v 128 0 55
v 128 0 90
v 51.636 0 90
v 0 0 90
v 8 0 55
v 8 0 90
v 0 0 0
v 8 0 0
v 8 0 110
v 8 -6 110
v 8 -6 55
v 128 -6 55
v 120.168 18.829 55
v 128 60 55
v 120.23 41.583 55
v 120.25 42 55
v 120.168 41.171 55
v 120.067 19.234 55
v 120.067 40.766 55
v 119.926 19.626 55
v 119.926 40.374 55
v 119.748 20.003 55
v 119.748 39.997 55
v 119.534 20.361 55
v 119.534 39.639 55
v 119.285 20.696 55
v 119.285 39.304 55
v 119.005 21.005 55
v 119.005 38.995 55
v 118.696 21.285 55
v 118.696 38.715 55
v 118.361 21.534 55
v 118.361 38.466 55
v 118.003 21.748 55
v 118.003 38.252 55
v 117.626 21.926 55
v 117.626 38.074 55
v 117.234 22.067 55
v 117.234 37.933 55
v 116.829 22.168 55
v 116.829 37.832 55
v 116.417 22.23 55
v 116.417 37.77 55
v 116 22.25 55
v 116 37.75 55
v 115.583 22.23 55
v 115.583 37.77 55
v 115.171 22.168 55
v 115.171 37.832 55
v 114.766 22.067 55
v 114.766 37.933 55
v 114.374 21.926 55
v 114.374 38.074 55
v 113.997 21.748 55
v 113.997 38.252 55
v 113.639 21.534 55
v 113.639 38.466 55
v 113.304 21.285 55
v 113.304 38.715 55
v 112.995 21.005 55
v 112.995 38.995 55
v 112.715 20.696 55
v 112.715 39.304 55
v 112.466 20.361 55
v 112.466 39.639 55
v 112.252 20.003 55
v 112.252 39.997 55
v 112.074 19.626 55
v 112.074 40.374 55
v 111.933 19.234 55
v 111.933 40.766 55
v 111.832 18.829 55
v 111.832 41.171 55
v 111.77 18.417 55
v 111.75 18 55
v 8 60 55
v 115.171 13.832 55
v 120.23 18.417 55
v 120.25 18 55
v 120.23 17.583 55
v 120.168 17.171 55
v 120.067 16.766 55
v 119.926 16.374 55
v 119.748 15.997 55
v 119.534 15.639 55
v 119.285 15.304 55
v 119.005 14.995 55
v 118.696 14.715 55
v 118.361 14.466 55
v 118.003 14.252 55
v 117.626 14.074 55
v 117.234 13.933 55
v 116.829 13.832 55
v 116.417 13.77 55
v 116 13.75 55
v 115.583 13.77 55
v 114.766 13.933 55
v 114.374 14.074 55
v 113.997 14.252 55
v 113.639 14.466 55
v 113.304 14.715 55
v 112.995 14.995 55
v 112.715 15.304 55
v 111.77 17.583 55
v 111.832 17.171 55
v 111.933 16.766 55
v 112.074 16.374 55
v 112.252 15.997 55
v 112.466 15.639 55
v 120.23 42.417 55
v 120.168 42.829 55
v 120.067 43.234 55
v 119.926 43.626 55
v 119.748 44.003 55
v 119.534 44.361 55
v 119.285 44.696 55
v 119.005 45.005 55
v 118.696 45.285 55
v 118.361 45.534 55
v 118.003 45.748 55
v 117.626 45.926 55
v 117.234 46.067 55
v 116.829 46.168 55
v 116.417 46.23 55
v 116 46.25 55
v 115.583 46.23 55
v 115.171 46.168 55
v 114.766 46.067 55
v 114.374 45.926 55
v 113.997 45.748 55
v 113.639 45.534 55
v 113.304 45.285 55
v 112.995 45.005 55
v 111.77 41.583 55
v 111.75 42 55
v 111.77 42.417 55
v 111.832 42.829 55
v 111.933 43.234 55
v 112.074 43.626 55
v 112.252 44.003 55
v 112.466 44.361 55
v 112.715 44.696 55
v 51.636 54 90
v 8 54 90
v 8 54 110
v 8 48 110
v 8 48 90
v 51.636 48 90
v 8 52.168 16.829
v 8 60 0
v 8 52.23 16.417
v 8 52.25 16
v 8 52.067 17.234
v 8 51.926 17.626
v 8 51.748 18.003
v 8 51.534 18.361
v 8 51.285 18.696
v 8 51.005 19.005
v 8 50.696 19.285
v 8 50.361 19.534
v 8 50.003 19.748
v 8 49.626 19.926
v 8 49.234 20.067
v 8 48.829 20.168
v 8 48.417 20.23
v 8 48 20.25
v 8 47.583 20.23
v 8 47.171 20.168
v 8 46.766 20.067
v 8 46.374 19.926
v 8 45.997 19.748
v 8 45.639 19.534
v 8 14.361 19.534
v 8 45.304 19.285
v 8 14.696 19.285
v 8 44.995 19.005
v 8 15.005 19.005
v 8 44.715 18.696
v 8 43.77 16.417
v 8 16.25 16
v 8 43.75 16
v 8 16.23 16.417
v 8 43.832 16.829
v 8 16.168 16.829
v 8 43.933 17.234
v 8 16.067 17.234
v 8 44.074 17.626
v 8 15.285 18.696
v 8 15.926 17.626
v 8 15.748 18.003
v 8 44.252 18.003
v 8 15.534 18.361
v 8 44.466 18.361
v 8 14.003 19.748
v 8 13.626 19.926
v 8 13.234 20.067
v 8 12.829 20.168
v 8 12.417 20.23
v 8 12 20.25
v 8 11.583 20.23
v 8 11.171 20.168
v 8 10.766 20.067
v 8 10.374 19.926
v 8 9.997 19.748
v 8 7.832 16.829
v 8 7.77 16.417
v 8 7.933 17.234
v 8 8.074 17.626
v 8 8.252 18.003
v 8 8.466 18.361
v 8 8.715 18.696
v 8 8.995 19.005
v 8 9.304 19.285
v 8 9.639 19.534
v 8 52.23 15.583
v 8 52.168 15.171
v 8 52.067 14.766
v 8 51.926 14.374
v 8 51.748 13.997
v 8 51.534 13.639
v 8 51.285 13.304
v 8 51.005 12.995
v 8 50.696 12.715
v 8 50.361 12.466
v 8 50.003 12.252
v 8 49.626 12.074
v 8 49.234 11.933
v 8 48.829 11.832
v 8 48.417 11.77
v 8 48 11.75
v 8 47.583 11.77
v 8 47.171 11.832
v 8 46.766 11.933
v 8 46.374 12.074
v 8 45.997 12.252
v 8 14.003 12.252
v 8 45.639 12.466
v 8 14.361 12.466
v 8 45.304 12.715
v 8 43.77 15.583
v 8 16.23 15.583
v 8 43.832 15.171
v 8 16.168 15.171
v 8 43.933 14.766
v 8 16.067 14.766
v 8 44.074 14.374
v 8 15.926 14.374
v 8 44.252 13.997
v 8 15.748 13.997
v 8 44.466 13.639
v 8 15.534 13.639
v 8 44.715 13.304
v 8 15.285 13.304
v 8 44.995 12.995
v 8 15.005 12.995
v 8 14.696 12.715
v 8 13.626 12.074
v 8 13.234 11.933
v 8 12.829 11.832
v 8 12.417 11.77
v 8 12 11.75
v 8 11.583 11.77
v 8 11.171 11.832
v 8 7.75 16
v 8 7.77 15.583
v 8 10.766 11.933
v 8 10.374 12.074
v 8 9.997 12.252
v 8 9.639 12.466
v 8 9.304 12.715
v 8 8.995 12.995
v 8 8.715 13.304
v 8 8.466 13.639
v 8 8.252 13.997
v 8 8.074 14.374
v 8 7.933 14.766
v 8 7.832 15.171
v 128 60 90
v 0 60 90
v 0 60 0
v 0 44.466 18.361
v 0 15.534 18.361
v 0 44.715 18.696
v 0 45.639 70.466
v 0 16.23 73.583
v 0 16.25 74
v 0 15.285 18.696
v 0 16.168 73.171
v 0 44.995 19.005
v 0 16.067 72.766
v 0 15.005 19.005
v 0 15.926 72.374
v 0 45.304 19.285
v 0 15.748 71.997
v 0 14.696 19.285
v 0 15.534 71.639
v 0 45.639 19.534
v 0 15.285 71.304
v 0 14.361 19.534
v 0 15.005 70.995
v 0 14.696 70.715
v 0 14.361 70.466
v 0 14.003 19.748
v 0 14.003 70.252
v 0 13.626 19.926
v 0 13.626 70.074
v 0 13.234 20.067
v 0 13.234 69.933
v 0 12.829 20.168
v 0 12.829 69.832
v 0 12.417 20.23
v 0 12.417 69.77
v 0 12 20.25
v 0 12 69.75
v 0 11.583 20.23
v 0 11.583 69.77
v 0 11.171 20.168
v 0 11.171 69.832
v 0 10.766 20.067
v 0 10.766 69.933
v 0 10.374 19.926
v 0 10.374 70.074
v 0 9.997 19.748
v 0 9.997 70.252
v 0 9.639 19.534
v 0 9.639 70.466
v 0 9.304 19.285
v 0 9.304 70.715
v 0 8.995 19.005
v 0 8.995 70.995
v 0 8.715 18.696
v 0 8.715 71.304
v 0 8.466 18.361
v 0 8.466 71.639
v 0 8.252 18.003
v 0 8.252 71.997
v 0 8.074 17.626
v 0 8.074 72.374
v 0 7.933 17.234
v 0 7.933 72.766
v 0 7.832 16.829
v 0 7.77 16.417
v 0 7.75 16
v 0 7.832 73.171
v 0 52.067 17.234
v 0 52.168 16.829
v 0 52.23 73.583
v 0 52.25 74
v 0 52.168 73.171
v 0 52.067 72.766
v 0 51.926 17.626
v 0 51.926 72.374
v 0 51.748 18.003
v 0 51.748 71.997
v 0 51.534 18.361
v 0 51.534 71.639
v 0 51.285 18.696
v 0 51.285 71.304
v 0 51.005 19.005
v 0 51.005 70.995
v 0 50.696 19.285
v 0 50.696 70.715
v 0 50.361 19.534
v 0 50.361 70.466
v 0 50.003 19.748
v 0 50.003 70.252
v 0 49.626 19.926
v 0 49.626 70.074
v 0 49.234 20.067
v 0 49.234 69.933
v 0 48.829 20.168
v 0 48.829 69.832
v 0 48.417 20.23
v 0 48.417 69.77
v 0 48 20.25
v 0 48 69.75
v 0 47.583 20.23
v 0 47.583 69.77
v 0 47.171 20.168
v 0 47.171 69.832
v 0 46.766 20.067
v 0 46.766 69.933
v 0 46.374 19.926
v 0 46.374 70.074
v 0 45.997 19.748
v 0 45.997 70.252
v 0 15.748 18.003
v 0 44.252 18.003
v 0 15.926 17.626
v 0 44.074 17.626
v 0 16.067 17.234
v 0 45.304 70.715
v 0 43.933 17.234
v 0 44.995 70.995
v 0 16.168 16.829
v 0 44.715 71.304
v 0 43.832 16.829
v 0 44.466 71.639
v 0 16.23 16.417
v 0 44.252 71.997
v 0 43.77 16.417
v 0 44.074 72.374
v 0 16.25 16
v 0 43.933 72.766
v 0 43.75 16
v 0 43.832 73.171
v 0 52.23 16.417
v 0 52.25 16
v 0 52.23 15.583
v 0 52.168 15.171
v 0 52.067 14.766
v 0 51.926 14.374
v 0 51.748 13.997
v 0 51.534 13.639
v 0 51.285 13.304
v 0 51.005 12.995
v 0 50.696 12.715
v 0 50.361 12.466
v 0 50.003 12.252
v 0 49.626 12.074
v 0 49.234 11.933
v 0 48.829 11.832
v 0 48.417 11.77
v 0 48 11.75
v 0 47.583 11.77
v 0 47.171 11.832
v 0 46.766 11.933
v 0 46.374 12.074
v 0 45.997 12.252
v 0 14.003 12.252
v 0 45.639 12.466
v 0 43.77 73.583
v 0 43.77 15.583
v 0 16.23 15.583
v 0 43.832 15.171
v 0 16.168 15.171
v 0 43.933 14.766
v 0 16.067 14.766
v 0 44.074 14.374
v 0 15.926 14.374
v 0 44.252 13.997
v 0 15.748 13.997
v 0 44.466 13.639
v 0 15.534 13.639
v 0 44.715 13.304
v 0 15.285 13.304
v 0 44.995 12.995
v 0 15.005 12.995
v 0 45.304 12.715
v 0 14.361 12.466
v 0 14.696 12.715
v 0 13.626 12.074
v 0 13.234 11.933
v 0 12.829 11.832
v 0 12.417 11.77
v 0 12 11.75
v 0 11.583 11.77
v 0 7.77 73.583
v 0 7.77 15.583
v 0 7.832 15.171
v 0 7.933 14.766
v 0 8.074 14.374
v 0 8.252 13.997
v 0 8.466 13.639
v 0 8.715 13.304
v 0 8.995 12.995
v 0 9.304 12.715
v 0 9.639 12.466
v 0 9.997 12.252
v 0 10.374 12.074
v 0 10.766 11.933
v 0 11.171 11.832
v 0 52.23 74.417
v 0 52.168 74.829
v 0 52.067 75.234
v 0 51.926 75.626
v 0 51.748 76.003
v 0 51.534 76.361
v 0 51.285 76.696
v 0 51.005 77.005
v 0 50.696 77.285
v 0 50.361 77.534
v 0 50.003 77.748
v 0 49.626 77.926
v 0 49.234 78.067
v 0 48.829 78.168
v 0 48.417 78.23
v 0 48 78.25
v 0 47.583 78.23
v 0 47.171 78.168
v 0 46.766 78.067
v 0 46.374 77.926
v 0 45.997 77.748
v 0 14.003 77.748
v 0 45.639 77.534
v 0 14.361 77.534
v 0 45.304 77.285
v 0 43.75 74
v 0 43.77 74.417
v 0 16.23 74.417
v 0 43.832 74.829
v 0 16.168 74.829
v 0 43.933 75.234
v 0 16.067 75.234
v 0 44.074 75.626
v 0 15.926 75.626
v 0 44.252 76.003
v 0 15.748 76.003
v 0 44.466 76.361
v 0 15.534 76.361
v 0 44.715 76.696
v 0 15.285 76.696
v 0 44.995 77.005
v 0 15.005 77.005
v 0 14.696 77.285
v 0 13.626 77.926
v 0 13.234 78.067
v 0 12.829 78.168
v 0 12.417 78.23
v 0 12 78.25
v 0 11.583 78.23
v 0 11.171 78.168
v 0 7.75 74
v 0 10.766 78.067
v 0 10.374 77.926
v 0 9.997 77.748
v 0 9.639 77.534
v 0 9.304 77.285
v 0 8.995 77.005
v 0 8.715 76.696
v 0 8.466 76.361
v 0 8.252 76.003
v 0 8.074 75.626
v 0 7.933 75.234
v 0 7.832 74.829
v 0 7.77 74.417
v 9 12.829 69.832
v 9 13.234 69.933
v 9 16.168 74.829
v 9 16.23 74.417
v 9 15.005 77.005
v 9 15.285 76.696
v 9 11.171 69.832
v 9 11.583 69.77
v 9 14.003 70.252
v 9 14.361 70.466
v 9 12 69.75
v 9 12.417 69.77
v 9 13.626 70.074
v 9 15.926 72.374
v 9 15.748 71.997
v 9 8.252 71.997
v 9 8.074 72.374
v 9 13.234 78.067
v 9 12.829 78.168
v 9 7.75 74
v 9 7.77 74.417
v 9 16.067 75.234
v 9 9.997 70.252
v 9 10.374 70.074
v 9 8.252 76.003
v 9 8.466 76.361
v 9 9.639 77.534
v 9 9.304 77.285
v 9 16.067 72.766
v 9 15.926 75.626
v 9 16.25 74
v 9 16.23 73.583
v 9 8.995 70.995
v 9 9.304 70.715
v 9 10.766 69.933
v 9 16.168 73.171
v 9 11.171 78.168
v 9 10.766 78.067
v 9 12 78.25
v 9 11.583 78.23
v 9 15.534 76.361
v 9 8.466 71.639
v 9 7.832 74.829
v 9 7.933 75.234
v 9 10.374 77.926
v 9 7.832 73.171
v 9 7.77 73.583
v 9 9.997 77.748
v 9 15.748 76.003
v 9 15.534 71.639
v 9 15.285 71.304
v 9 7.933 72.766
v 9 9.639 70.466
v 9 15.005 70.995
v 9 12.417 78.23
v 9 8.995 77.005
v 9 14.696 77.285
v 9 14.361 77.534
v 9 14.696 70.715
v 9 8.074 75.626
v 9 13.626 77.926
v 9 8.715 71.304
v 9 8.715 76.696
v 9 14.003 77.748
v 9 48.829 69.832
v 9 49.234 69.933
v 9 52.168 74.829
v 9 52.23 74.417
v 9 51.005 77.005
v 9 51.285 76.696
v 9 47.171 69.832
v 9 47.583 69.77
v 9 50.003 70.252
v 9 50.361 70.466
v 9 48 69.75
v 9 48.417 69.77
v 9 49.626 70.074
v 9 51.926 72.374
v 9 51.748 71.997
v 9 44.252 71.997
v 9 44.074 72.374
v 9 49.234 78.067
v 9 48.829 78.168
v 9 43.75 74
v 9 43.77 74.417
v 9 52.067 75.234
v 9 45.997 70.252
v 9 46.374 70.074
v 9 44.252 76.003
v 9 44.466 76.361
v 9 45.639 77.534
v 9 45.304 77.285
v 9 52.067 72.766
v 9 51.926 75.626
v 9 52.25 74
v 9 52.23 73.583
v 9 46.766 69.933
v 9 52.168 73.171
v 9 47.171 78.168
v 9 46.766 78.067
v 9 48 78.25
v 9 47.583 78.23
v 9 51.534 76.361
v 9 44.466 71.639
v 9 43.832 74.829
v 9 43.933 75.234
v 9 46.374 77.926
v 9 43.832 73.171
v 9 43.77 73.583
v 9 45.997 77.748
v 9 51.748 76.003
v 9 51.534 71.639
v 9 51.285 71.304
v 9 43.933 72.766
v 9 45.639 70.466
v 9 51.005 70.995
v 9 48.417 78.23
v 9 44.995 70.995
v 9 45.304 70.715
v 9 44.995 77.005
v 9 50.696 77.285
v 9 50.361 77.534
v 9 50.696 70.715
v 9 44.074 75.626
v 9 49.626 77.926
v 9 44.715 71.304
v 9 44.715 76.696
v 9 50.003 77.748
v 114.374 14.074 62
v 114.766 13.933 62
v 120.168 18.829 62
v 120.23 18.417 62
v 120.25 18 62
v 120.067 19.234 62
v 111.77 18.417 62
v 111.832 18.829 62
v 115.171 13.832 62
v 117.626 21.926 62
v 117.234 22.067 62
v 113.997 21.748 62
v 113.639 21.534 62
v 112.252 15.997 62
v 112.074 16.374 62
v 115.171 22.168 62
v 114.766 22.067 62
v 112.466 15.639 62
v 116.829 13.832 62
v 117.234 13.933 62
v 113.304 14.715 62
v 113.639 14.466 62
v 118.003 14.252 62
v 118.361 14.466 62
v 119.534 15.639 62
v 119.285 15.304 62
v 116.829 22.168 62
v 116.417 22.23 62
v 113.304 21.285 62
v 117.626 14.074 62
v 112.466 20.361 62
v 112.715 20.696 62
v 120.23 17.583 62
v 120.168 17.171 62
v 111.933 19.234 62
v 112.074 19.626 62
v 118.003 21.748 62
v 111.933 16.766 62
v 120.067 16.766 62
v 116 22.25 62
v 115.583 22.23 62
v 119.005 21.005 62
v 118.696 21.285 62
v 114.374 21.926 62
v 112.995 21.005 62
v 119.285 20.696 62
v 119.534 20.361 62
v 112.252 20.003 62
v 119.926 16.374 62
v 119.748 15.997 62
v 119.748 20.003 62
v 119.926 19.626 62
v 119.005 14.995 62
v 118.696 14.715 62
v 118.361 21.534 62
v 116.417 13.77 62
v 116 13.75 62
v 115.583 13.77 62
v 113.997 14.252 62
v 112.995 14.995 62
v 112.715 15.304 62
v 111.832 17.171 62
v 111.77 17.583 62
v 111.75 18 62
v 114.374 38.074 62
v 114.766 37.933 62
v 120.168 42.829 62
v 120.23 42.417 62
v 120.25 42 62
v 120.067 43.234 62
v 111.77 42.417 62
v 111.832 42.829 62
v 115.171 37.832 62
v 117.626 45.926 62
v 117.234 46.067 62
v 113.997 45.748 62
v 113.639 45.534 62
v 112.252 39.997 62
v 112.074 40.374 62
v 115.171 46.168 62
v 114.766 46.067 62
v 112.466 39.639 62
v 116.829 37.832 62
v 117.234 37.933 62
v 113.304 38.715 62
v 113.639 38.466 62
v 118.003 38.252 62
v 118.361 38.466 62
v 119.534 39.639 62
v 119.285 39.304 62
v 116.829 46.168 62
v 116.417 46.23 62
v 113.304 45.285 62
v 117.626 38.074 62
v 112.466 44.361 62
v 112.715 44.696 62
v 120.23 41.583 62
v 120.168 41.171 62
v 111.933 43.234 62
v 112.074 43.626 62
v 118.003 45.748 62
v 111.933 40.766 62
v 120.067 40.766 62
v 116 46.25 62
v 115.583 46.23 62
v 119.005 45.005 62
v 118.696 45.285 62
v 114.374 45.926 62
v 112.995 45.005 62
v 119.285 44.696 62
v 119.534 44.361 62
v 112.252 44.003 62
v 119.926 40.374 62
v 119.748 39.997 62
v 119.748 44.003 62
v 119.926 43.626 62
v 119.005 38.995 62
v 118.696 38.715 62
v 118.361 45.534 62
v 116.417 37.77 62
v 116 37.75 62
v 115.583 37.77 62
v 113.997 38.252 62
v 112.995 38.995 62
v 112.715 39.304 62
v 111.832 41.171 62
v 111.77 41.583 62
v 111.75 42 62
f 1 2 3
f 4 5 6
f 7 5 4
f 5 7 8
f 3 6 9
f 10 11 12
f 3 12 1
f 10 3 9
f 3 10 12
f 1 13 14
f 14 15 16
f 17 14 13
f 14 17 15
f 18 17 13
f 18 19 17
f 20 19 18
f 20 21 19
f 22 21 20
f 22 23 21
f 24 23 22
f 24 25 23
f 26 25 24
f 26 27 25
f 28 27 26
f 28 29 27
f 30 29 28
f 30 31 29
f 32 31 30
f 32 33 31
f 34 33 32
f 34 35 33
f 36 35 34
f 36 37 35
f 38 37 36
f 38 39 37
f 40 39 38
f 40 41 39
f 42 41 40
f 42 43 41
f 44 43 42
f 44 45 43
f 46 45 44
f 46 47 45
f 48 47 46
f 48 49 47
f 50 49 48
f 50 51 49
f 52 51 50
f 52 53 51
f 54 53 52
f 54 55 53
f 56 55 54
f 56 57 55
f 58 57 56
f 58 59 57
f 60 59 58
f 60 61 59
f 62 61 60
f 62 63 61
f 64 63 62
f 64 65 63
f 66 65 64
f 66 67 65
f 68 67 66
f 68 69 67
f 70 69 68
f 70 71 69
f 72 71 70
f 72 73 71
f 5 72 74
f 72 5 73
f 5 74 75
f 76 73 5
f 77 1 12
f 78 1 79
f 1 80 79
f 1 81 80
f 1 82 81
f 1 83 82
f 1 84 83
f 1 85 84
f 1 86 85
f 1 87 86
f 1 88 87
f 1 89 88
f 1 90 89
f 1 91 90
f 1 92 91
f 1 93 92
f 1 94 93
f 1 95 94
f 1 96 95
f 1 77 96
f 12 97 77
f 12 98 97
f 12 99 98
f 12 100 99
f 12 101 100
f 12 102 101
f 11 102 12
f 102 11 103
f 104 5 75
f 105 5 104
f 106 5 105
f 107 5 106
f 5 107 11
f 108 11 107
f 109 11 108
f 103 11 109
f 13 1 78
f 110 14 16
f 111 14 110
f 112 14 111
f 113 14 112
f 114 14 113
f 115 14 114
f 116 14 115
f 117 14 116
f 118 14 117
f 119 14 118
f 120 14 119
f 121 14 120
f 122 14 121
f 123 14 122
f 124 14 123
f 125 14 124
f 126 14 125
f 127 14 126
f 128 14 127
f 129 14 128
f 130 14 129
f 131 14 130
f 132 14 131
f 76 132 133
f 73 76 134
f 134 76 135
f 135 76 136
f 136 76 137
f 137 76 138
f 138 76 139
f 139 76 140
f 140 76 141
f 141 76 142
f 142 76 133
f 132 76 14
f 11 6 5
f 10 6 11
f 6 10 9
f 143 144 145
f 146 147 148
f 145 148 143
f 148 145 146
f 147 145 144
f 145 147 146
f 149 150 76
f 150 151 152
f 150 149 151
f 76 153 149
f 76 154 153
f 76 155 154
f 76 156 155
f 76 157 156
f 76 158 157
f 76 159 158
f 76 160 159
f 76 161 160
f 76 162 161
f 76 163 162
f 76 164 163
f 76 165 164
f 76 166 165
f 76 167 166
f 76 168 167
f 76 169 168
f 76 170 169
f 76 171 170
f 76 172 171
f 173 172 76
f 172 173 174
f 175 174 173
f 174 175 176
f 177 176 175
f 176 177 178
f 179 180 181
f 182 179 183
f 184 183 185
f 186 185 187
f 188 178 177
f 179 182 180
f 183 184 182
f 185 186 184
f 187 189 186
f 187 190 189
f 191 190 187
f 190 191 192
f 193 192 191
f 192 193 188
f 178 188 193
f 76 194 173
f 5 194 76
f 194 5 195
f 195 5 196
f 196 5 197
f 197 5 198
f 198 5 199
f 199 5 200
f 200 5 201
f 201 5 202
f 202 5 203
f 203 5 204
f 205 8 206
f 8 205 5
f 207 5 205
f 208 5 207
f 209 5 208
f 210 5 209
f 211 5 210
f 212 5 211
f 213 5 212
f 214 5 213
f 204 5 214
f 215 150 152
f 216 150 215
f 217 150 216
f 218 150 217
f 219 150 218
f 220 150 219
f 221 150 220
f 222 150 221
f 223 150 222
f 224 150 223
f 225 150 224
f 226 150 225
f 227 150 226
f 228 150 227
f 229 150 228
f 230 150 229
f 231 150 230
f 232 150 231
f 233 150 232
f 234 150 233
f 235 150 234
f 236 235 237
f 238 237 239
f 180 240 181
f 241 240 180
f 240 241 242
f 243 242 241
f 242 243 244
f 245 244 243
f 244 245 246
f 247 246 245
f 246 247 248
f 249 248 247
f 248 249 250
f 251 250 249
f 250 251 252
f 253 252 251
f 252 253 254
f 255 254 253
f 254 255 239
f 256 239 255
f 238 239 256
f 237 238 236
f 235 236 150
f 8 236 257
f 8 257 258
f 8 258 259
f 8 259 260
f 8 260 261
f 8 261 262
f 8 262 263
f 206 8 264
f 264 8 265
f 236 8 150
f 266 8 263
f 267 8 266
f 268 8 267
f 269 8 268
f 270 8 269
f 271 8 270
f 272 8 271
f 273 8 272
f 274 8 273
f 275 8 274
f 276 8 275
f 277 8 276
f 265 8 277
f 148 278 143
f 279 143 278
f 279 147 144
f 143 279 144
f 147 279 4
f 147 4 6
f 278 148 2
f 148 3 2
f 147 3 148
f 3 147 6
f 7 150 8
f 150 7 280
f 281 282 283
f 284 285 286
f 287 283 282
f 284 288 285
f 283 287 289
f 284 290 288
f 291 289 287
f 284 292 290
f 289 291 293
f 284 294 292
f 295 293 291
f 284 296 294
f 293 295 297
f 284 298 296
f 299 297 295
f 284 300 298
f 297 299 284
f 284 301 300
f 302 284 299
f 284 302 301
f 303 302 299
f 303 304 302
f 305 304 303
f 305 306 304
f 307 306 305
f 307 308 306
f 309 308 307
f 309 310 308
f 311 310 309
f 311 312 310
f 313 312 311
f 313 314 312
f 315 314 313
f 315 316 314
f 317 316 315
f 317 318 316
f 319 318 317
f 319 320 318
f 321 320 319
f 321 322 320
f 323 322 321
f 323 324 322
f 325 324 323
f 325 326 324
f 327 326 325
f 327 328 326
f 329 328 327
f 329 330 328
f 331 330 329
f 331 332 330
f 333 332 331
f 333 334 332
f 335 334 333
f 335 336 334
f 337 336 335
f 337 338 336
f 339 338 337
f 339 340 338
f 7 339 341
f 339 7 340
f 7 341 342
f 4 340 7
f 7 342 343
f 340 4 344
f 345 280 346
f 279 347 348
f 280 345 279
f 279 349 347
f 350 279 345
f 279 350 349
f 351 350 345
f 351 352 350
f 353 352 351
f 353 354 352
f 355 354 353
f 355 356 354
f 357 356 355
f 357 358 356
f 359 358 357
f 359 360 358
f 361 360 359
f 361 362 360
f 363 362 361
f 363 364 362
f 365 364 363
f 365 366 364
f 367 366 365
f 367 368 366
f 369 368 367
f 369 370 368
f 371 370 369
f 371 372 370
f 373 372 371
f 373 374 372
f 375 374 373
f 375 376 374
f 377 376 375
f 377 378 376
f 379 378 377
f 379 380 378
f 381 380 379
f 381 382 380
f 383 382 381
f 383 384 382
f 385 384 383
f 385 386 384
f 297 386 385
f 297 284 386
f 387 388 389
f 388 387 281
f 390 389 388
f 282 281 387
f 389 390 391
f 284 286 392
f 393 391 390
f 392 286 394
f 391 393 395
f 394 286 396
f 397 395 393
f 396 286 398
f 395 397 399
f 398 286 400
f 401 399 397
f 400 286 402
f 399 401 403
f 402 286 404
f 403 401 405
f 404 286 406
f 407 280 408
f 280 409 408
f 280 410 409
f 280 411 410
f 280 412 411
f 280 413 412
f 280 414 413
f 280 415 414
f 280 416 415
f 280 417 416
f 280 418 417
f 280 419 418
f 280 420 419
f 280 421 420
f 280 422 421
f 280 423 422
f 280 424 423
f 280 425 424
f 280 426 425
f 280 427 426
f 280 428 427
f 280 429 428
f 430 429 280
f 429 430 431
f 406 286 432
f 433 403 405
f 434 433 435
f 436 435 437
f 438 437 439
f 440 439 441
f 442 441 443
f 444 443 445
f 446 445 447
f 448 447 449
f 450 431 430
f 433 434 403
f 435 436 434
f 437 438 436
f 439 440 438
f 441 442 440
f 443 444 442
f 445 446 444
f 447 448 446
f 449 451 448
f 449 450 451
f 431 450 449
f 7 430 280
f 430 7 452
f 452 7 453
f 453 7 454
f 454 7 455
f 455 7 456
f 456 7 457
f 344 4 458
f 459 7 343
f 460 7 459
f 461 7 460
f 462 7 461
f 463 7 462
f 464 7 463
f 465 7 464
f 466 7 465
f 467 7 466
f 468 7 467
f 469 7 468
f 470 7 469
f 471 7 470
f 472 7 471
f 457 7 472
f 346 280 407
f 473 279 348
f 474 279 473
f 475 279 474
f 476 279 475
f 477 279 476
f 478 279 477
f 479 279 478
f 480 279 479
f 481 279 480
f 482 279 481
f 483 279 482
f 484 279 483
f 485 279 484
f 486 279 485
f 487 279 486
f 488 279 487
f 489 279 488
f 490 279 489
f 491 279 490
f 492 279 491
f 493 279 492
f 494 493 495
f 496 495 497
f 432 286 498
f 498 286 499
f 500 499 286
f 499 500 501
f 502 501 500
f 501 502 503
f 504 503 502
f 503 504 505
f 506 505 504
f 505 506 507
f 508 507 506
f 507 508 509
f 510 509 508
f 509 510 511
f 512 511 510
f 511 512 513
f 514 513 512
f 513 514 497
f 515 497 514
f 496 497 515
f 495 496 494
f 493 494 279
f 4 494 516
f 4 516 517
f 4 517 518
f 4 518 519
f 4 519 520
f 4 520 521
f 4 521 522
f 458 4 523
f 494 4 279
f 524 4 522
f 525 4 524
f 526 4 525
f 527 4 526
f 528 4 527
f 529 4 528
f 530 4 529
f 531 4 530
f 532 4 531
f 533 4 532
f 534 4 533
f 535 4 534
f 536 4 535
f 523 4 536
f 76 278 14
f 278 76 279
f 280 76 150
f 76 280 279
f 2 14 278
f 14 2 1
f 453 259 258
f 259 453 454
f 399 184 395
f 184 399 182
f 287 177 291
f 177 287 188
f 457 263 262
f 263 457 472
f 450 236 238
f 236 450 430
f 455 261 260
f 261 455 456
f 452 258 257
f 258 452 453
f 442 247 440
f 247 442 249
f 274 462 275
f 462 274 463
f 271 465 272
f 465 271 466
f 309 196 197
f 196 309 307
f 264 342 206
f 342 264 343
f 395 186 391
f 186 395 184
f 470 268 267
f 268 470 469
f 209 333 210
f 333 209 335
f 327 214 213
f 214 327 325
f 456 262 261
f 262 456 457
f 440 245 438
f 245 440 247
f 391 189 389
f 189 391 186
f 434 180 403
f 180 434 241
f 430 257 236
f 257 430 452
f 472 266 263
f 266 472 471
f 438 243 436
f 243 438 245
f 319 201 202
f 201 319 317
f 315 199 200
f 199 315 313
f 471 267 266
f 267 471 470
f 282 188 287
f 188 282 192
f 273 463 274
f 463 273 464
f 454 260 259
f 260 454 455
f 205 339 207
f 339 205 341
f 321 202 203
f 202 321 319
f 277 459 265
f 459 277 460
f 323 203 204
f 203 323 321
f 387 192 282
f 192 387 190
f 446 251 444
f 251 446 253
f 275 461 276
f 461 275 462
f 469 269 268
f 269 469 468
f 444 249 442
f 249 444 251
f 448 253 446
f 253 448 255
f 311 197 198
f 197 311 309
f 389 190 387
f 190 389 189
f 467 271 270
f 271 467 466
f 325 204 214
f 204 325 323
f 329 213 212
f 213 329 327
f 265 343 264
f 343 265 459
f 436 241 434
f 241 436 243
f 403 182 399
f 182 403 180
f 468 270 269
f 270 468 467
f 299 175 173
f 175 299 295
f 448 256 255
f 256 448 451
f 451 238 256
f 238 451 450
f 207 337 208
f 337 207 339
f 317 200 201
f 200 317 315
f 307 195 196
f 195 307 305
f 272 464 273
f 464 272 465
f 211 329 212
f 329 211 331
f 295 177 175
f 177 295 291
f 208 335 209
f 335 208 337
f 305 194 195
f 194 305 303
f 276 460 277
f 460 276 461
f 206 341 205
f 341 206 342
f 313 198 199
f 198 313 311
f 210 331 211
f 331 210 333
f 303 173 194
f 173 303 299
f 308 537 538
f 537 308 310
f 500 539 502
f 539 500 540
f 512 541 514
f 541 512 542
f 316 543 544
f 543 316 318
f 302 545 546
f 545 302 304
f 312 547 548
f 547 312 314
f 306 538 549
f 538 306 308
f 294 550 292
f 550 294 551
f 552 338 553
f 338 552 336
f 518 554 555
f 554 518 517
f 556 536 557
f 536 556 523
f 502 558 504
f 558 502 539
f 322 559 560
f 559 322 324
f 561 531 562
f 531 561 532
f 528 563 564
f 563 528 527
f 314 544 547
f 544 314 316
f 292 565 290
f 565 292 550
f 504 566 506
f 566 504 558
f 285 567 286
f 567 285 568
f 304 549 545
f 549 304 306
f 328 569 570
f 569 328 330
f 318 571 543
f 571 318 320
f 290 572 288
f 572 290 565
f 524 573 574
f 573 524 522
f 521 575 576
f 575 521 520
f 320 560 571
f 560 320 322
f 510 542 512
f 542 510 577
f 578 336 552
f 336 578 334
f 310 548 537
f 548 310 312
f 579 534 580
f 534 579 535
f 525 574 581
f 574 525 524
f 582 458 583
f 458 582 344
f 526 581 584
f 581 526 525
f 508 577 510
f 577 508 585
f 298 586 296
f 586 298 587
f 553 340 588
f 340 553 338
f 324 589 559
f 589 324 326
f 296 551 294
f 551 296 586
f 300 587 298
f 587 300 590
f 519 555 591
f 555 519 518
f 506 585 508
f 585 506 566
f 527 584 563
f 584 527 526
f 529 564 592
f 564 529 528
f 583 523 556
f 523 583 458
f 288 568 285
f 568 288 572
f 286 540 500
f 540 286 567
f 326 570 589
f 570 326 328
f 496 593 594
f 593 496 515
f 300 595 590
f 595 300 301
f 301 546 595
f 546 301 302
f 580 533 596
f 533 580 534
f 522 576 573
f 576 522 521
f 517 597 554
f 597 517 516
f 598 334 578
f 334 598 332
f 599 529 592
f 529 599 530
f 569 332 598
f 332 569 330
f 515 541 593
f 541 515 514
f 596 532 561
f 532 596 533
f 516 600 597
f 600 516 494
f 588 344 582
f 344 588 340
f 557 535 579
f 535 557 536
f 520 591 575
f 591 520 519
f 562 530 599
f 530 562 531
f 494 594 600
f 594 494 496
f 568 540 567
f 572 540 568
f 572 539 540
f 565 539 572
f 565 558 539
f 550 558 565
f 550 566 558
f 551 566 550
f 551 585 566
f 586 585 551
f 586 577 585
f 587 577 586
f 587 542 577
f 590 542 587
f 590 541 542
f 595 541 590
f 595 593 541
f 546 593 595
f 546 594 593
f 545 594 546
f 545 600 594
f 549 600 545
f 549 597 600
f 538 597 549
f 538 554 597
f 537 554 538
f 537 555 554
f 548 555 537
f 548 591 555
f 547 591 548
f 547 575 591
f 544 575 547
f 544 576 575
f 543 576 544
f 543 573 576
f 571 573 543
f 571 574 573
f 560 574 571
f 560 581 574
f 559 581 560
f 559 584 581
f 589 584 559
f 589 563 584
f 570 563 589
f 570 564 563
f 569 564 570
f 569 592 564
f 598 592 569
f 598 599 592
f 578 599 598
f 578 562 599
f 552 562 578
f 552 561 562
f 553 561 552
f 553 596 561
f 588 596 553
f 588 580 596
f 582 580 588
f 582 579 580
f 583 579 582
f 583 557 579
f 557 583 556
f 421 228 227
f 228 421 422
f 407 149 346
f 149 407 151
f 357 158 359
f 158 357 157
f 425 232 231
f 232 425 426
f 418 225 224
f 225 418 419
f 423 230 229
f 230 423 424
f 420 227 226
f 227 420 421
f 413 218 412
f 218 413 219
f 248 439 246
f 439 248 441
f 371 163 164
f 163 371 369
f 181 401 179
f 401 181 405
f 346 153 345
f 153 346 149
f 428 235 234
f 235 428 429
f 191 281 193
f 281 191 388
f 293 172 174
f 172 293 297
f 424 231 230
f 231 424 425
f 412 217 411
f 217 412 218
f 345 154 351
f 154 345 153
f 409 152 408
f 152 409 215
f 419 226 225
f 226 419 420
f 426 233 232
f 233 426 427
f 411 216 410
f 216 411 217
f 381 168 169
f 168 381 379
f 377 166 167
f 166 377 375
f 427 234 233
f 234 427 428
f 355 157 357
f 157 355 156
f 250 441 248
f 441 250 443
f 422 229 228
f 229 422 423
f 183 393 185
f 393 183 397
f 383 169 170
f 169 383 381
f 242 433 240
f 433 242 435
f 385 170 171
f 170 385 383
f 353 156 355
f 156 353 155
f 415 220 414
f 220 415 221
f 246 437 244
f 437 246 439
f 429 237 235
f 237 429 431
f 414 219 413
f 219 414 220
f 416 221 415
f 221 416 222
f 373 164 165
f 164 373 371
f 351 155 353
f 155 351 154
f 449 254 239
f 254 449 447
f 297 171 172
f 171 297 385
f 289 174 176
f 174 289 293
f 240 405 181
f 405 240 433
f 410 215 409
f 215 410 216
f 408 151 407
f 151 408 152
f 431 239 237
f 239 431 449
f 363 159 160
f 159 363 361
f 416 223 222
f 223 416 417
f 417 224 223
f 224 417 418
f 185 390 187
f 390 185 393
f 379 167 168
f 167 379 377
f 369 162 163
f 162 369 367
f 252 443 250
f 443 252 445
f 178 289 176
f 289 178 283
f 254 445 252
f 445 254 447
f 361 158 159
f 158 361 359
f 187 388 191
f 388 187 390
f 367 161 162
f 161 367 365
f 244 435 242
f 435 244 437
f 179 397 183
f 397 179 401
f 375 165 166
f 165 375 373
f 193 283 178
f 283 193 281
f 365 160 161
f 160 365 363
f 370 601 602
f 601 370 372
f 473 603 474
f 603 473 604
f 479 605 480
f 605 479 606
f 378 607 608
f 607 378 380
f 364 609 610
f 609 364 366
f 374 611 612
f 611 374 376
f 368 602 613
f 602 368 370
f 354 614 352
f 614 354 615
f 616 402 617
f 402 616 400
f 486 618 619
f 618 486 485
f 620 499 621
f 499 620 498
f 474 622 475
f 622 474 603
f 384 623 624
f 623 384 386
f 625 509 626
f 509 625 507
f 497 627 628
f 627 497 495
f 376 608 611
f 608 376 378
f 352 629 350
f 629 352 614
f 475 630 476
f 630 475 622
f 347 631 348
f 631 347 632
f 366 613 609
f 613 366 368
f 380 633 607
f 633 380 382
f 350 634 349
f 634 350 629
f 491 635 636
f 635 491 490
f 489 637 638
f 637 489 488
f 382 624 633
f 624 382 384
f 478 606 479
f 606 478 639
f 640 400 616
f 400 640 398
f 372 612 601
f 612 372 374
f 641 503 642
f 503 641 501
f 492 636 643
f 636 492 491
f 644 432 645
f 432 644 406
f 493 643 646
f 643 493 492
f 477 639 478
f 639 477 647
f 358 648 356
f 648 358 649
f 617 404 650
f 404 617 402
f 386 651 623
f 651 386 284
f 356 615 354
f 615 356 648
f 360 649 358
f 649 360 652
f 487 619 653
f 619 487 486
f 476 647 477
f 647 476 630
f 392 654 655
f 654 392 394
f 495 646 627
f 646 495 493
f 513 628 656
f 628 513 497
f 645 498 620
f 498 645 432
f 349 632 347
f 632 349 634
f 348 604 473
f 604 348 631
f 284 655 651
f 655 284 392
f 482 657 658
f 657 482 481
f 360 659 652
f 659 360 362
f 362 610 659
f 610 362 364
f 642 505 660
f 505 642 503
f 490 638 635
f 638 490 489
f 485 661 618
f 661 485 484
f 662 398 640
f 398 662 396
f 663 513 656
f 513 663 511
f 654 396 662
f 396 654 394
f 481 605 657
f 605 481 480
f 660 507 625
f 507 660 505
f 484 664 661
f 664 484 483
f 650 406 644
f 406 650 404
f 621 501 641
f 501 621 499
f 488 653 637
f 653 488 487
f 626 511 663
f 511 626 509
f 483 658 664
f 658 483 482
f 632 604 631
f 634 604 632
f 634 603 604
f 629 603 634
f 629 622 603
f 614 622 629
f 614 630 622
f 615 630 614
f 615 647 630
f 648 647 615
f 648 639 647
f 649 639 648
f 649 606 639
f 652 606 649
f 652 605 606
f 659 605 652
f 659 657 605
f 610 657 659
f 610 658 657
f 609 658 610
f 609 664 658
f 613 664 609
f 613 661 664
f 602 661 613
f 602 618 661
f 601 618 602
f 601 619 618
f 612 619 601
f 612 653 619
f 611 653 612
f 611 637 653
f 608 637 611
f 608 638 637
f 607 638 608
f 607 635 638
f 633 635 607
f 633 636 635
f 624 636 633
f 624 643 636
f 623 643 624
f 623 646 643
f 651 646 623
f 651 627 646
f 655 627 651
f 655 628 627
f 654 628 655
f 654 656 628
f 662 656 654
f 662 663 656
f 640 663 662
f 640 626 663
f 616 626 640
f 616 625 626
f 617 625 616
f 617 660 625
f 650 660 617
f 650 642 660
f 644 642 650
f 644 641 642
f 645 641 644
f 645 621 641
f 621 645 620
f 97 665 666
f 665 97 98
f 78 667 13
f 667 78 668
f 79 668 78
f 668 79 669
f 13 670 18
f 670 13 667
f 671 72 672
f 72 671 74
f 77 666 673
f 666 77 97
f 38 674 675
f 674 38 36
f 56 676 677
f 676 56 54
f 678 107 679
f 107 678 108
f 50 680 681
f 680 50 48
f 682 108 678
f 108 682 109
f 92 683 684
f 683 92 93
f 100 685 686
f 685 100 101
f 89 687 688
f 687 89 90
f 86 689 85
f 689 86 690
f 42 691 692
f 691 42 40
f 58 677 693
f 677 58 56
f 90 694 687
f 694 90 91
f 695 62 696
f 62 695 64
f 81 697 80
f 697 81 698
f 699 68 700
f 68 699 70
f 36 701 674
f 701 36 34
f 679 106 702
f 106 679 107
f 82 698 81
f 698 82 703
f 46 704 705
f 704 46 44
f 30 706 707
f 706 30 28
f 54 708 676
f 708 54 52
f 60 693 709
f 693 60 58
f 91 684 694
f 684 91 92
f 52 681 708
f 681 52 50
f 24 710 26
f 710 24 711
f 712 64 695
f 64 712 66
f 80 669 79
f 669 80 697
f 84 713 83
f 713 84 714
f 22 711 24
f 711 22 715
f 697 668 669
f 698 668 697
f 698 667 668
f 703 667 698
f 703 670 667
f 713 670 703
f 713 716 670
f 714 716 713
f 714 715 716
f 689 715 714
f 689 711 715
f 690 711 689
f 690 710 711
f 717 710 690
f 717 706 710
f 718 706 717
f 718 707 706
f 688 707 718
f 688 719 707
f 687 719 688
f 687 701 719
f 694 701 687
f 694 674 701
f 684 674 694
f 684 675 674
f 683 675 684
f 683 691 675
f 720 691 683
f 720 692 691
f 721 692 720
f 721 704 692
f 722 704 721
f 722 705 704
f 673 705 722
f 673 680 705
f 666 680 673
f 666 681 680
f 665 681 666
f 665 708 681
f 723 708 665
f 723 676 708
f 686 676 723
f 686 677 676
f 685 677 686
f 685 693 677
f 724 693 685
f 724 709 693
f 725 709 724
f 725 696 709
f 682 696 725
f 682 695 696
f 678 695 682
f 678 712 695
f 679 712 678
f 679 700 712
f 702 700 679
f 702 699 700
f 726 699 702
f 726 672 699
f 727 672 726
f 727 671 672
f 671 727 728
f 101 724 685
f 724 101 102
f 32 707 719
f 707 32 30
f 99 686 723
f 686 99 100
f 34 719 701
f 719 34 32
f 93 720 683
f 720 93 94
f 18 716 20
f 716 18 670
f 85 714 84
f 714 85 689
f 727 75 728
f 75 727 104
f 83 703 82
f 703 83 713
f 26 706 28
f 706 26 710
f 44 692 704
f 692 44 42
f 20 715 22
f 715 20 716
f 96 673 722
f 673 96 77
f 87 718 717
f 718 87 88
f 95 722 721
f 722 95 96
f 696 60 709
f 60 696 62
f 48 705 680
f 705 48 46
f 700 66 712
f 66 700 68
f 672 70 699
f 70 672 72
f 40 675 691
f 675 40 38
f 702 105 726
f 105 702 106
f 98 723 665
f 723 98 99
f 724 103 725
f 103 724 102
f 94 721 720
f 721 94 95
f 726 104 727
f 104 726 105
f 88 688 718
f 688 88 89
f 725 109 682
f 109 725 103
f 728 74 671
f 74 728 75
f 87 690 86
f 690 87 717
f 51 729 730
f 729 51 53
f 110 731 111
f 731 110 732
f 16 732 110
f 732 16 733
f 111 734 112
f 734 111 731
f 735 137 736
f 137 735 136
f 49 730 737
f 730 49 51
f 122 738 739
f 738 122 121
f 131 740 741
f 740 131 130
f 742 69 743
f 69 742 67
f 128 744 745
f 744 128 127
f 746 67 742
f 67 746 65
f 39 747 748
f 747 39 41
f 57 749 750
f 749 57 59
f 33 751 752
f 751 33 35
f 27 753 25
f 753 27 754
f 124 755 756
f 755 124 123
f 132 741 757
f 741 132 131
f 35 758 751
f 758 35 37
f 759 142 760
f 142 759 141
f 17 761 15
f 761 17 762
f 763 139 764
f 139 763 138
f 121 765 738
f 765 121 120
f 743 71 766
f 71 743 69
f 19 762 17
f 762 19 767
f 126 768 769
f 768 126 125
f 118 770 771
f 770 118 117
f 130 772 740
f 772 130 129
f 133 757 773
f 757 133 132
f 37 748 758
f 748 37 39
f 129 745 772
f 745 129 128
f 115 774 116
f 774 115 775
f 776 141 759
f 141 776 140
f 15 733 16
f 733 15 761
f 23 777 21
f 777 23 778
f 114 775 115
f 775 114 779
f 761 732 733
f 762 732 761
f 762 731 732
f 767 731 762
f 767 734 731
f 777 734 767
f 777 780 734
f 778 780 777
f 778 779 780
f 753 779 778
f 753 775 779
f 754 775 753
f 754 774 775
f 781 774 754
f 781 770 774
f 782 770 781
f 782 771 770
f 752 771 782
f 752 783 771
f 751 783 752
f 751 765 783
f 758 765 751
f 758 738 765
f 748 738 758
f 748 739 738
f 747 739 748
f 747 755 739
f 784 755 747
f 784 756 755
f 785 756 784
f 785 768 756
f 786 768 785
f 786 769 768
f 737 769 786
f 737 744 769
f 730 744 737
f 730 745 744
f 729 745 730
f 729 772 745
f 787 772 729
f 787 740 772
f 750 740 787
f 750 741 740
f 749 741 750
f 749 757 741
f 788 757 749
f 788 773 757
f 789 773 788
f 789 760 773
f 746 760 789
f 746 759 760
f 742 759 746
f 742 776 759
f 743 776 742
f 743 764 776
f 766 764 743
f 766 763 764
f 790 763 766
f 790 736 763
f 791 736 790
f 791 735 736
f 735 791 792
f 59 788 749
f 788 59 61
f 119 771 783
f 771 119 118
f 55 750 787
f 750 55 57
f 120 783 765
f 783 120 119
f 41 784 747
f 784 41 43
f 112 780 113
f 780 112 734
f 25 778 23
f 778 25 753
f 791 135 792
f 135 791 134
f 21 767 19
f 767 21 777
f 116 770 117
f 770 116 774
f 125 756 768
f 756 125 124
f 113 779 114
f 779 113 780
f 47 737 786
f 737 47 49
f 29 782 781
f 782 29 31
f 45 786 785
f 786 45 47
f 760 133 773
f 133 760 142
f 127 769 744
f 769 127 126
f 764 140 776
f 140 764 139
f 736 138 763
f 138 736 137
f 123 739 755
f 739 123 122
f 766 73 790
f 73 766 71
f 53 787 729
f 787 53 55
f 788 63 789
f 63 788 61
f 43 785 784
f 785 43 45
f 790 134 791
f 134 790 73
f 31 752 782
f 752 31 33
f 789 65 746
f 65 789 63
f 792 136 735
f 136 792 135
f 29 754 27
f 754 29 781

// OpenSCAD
// Original MechIntel educational model. CC0-1.0. Units: mm.
// Not a standardized or load-rated component.
$fn=96;
plate_height=90; plate_width=60; plate_thickness=8; arm_reach=120; arm_width=35; gusset=6; slot=8.5;
$fn=64;
difference(){
 union(){
  cube([plate_thickness,plate_width,plate_height]);
  translate([plate_thickness,0,plate_height-arm_width]) cube([arm_reach,plate_width,arm_width]);
  for(y=[0,plate_width-gusset]) translate([plate_thickness,y,plate_height-arm_width]) rotate([90,0,0]) linear_extrude(height=gusset) polygon([[0,0],[arm_reach,0],[0,plate_height-arm_width]]);
  translate([plate_thickness+arm_reach-18,0,plate_height-arm_width]) cube([18,plate_width,5]);
 }
 for(y=[plate_width/2-18,plate_width/2+18]) for(z=[16,plate_height-16]) translate([-1,y,z]) rotate([0,90,0]) cylinder(d=slot,h=plate_thickness+2);
 for(x=[plate_thickness+arm_reach-12]) for(y=[plate_width/2-12,plate_width/2+12]) translate([x,y,plate_height-arm_width-1]) cylinder(d=8.5,h=8);
}
